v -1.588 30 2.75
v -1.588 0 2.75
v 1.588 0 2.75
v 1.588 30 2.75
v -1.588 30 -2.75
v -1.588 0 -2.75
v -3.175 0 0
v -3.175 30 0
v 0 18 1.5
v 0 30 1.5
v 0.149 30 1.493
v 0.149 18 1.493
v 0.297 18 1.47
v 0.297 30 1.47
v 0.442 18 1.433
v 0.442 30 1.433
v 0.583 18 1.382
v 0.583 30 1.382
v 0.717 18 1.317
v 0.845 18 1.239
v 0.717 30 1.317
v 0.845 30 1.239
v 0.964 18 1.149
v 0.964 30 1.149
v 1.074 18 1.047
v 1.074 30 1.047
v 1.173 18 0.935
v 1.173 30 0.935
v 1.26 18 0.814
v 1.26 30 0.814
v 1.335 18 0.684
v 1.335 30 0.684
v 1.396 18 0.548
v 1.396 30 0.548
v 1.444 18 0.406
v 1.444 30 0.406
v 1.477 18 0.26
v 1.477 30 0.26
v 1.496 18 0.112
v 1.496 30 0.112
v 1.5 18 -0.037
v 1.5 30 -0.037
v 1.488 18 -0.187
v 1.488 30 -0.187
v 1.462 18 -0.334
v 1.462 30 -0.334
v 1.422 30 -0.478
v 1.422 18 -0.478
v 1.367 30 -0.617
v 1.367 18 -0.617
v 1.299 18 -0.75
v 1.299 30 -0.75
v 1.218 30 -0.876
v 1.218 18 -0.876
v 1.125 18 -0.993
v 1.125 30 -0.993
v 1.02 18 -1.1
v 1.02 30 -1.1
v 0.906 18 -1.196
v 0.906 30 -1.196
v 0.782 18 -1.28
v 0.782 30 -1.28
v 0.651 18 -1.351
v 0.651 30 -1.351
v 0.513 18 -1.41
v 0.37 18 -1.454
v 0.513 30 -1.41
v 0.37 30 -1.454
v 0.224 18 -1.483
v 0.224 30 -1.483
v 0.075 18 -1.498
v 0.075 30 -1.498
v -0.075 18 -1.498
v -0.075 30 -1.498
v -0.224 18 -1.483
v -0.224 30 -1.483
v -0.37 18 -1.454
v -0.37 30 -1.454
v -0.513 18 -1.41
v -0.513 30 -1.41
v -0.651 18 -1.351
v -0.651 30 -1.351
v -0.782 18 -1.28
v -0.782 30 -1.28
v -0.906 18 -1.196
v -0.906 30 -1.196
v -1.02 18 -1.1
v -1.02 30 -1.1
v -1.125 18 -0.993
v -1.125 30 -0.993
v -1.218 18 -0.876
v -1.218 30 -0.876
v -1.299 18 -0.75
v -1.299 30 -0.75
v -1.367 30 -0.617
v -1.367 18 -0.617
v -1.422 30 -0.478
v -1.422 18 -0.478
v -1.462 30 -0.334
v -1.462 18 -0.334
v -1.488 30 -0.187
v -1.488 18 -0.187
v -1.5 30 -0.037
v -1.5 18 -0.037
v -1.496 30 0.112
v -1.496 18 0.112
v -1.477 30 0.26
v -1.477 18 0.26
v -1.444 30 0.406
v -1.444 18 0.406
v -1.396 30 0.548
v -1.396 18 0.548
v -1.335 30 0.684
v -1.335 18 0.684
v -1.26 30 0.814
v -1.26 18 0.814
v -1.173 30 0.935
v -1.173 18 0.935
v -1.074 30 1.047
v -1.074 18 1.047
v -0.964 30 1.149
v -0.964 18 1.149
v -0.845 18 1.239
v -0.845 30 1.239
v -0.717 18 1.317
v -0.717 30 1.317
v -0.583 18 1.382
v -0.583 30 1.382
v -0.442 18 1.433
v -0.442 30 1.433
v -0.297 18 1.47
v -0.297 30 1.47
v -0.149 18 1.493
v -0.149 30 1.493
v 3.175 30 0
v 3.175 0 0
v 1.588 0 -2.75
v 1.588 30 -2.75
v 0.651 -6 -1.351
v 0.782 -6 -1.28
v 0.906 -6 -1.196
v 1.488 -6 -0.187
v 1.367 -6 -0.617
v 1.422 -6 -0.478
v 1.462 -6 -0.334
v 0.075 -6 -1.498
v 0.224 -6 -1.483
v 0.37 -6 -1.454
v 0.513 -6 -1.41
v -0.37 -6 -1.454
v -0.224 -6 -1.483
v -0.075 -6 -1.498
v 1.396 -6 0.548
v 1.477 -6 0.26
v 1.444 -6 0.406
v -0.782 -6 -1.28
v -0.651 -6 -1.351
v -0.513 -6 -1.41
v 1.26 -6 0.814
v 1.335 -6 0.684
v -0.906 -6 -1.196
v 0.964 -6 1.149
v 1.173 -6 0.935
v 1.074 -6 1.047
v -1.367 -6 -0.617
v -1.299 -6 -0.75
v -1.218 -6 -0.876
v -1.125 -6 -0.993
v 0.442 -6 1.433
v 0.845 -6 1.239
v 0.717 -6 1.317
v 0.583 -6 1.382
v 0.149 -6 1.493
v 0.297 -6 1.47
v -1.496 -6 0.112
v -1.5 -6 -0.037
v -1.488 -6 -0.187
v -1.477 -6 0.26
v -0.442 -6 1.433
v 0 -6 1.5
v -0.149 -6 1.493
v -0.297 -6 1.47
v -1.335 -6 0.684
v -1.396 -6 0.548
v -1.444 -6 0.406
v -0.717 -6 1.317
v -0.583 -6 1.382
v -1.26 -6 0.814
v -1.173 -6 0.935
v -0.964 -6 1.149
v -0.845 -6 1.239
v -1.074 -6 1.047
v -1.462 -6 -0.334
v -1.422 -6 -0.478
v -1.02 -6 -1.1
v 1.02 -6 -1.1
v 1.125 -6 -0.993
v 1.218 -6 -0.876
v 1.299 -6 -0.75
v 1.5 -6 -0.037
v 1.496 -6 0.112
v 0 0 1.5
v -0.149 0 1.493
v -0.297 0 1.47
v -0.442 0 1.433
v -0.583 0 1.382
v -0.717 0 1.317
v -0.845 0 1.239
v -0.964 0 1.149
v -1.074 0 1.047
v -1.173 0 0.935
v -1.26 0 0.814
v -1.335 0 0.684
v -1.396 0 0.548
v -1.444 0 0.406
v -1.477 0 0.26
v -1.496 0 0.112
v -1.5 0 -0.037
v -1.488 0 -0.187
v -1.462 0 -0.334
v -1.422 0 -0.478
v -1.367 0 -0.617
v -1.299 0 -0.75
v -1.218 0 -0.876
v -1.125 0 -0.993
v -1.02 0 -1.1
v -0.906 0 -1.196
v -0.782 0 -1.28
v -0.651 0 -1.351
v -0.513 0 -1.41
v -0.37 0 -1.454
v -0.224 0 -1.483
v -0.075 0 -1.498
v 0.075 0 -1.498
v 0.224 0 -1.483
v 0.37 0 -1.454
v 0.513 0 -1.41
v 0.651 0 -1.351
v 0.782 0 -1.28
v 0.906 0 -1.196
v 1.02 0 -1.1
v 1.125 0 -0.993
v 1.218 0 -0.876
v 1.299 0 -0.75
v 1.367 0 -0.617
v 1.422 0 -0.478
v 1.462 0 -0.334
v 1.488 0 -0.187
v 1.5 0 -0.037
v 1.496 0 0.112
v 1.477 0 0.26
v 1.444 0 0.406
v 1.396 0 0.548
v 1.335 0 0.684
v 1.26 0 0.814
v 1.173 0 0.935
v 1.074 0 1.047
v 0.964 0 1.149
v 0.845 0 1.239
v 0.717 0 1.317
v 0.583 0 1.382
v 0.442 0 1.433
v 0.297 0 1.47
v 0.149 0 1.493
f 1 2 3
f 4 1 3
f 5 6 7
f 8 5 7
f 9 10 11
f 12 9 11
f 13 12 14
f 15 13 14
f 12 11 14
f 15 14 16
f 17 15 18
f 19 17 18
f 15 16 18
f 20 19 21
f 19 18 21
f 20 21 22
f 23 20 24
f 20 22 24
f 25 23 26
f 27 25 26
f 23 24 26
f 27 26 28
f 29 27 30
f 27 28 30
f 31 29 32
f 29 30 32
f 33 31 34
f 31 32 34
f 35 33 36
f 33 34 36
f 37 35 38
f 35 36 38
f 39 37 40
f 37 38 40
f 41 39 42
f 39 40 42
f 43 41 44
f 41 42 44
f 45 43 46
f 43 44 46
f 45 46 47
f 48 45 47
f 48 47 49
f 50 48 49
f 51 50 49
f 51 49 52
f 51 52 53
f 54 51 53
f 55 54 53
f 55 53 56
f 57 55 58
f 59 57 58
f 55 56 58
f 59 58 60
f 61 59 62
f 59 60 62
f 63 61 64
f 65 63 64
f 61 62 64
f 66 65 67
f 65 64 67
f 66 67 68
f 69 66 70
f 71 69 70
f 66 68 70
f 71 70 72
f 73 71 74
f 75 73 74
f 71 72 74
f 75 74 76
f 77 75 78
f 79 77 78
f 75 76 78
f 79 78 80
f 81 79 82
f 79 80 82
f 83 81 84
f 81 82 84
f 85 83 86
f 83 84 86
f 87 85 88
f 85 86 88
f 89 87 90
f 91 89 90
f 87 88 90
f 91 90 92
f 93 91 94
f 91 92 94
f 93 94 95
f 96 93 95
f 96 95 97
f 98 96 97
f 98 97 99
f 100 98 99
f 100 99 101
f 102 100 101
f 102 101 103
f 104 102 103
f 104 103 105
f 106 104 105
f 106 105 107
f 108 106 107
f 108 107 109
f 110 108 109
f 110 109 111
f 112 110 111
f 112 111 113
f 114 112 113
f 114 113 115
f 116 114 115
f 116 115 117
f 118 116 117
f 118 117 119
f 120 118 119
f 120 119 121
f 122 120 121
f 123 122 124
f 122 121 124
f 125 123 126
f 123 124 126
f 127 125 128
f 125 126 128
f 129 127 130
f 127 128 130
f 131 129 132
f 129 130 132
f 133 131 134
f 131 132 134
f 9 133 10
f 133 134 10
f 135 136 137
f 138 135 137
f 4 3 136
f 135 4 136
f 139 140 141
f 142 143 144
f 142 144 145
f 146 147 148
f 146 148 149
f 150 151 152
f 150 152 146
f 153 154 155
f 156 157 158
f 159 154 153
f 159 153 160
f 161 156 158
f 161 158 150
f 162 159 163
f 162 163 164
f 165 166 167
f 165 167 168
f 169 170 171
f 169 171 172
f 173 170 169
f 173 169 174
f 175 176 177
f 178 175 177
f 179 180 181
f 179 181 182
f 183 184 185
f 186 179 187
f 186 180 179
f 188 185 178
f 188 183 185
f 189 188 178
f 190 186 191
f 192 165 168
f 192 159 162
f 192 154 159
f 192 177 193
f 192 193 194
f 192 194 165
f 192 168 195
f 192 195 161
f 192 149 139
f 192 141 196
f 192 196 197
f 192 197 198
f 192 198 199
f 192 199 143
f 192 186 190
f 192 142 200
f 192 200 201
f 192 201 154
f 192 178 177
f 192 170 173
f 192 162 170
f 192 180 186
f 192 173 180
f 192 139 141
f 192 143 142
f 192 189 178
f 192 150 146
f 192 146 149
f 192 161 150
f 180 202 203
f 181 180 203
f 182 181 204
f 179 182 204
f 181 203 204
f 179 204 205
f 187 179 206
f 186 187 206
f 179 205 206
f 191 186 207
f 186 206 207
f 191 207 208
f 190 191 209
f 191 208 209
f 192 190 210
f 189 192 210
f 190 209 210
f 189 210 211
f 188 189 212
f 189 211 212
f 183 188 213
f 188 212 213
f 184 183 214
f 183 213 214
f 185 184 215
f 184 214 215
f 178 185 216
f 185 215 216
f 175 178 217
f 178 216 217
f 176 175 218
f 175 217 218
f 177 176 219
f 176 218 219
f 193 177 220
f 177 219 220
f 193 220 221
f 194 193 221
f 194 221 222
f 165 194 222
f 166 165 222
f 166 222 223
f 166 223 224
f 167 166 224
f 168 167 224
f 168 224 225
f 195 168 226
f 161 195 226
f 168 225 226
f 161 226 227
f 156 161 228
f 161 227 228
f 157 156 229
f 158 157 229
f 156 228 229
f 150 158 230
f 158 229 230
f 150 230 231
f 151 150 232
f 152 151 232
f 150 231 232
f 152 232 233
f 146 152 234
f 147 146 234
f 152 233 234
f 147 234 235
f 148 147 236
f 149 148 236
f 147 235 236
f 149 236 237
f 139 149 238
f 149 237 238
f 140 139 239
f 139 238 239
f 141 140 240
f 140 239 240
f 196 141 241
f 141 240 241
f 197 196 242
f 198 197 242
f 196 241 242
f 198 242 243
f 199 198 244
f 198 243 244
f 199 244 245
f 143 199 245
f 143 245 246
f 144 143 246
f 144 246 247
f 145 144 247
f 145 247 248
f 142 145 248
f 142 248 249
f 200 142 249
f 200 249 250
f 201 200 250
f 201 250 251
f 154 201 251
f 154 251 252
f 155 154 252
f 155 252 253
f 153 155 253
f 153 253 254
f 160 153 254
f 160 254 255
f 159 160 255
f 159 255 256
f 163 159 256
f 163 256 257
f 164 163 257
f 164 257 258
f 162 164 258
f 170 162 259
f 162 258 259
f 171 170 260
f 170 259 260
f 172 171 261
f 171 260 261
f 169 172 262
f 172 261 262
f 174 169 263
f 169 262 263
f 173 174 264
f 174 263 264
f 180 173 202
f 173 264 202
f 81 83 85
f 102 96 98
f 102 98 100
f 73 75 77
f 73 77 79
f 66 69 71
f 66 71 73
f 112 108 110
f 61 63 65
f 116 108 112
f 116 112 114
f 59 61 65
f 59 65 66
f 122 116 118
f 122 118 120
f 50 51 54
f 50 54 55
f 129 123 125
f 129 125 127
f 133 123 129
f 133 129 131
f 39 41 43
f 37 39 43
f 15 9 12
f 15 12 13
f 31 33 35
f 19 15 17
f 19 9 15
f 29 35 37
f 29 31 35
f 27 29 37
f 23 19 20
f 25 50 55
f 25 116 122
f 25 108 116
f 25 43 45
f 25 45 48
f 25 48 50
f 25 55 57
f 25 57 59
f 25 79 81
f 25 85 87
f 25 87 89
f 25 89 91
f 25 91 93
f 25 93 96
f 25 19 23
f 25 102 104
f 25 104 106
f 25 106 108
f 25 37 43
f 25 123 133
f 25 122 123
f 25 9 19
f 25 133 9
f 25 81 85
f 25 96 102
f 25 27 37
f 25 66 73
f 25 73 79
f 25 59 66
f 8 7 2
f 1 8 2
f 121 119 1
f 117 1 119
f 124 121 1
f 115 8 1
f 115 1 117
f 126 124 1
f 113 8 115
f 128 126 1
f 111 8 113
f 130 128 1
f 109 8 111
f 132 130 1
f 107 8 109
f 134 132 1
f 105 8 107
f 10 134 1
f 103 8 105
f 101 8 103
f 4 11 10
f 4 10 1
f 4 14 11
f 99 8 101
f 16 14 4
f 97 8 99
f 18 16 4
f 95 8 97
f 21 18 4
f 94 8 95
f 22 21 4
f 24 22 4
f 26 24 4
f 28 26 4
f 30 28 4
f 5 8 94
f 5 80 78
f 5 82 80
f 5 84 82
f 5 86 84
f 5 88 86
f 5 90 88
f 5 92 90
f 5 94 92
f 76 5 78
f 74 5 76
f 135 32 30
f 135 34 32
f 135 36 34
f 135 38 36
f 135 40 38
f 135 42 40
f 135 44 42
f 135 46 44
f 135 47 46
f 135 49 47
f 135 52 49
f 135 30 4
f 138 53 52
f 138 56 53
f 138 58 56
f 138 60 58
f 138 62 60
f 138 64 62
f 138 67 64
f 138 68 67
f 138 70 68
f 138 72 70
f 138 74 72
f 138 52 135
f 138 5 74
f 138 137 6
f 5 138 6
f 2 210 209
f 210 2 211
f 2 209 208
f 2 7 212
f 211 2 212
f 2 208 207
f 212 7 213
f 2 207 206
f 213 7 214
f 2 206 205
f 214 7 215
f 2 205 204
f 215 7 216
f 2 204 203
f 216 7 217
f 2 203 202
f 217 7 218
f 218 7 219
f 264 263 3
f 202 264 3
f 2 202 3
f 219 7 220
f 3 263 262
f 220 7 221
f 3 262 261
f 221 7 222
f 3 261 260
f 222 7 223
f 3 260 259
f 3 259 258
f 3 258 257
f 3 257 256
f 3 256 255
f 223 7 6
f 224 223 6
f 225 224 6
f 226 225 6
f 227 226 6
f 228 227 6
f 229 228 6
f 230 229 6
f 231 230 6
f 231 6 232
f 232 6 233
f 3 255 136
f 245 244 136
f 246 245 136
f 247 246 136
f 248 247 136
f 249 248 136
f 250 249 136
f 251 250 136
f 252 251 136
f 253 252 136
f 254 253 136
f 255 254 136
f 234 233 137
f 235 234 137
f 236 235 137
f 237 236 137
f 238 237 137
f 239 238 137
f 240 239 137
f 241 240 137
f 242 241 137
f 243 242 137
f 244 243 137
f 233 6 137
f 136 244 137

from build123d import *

# Parameters (mm, degrees)
BOSS_EXTRUDE1_DEPTH = 30
SKETCH2_R           = 1.5
CUT_EXTRUDE1_DEPTH  = 12
SKETCH3_R           = 1.5
BOSS_EXTRUDE2_DEPTH = 6


with BuildPart() as part:
    # Sketch1 → Boss-Extrude1 (new body)
    with BuildSketch(Plane(origin=(0, 0, 0), x_dir=(1, 0, 0), z_dir=(0, 1, 0))):
        Polygon((3.175426481, 0), (1.58771324, 2.75), (-1.58771324, 2.75), (-3.175426481, 0), (-1.58771324, -2.75), (1.58771324, -2.75), align=None)
    extrude(amount=BOSS_EXTRUDE1_DEPTH)

    # Sketch2 → Cut-Extrude1 (cut)
    with BuildSketch(Plane(origin=(0, 30, 0), x_dir=(1, 0, 0), z_dir=(0, 1, 0))):
        with Locations(Location((0, 0, 0), (0, 0, 270))):
            Circle(SKETCH2_R)
    extrude(amount=-CUT_EXTRUDE1_DEPTH, mode=Mode.SUBTRACT)

    # Sketch3 → Boss-Extrude2 (add)
    with BuildSketch(Plane(origin=(0, 0, 0), x_dir=(-1, 0, 0), z_dir=(0, -1, 0))):
        with Locations(Location((0, 0, 0), (0, 0, 270))):
            Circle(SKETCH3_R)
    extrude(amount=BOSS_EXTRUDE2_DEPTH)


solid = part.part
